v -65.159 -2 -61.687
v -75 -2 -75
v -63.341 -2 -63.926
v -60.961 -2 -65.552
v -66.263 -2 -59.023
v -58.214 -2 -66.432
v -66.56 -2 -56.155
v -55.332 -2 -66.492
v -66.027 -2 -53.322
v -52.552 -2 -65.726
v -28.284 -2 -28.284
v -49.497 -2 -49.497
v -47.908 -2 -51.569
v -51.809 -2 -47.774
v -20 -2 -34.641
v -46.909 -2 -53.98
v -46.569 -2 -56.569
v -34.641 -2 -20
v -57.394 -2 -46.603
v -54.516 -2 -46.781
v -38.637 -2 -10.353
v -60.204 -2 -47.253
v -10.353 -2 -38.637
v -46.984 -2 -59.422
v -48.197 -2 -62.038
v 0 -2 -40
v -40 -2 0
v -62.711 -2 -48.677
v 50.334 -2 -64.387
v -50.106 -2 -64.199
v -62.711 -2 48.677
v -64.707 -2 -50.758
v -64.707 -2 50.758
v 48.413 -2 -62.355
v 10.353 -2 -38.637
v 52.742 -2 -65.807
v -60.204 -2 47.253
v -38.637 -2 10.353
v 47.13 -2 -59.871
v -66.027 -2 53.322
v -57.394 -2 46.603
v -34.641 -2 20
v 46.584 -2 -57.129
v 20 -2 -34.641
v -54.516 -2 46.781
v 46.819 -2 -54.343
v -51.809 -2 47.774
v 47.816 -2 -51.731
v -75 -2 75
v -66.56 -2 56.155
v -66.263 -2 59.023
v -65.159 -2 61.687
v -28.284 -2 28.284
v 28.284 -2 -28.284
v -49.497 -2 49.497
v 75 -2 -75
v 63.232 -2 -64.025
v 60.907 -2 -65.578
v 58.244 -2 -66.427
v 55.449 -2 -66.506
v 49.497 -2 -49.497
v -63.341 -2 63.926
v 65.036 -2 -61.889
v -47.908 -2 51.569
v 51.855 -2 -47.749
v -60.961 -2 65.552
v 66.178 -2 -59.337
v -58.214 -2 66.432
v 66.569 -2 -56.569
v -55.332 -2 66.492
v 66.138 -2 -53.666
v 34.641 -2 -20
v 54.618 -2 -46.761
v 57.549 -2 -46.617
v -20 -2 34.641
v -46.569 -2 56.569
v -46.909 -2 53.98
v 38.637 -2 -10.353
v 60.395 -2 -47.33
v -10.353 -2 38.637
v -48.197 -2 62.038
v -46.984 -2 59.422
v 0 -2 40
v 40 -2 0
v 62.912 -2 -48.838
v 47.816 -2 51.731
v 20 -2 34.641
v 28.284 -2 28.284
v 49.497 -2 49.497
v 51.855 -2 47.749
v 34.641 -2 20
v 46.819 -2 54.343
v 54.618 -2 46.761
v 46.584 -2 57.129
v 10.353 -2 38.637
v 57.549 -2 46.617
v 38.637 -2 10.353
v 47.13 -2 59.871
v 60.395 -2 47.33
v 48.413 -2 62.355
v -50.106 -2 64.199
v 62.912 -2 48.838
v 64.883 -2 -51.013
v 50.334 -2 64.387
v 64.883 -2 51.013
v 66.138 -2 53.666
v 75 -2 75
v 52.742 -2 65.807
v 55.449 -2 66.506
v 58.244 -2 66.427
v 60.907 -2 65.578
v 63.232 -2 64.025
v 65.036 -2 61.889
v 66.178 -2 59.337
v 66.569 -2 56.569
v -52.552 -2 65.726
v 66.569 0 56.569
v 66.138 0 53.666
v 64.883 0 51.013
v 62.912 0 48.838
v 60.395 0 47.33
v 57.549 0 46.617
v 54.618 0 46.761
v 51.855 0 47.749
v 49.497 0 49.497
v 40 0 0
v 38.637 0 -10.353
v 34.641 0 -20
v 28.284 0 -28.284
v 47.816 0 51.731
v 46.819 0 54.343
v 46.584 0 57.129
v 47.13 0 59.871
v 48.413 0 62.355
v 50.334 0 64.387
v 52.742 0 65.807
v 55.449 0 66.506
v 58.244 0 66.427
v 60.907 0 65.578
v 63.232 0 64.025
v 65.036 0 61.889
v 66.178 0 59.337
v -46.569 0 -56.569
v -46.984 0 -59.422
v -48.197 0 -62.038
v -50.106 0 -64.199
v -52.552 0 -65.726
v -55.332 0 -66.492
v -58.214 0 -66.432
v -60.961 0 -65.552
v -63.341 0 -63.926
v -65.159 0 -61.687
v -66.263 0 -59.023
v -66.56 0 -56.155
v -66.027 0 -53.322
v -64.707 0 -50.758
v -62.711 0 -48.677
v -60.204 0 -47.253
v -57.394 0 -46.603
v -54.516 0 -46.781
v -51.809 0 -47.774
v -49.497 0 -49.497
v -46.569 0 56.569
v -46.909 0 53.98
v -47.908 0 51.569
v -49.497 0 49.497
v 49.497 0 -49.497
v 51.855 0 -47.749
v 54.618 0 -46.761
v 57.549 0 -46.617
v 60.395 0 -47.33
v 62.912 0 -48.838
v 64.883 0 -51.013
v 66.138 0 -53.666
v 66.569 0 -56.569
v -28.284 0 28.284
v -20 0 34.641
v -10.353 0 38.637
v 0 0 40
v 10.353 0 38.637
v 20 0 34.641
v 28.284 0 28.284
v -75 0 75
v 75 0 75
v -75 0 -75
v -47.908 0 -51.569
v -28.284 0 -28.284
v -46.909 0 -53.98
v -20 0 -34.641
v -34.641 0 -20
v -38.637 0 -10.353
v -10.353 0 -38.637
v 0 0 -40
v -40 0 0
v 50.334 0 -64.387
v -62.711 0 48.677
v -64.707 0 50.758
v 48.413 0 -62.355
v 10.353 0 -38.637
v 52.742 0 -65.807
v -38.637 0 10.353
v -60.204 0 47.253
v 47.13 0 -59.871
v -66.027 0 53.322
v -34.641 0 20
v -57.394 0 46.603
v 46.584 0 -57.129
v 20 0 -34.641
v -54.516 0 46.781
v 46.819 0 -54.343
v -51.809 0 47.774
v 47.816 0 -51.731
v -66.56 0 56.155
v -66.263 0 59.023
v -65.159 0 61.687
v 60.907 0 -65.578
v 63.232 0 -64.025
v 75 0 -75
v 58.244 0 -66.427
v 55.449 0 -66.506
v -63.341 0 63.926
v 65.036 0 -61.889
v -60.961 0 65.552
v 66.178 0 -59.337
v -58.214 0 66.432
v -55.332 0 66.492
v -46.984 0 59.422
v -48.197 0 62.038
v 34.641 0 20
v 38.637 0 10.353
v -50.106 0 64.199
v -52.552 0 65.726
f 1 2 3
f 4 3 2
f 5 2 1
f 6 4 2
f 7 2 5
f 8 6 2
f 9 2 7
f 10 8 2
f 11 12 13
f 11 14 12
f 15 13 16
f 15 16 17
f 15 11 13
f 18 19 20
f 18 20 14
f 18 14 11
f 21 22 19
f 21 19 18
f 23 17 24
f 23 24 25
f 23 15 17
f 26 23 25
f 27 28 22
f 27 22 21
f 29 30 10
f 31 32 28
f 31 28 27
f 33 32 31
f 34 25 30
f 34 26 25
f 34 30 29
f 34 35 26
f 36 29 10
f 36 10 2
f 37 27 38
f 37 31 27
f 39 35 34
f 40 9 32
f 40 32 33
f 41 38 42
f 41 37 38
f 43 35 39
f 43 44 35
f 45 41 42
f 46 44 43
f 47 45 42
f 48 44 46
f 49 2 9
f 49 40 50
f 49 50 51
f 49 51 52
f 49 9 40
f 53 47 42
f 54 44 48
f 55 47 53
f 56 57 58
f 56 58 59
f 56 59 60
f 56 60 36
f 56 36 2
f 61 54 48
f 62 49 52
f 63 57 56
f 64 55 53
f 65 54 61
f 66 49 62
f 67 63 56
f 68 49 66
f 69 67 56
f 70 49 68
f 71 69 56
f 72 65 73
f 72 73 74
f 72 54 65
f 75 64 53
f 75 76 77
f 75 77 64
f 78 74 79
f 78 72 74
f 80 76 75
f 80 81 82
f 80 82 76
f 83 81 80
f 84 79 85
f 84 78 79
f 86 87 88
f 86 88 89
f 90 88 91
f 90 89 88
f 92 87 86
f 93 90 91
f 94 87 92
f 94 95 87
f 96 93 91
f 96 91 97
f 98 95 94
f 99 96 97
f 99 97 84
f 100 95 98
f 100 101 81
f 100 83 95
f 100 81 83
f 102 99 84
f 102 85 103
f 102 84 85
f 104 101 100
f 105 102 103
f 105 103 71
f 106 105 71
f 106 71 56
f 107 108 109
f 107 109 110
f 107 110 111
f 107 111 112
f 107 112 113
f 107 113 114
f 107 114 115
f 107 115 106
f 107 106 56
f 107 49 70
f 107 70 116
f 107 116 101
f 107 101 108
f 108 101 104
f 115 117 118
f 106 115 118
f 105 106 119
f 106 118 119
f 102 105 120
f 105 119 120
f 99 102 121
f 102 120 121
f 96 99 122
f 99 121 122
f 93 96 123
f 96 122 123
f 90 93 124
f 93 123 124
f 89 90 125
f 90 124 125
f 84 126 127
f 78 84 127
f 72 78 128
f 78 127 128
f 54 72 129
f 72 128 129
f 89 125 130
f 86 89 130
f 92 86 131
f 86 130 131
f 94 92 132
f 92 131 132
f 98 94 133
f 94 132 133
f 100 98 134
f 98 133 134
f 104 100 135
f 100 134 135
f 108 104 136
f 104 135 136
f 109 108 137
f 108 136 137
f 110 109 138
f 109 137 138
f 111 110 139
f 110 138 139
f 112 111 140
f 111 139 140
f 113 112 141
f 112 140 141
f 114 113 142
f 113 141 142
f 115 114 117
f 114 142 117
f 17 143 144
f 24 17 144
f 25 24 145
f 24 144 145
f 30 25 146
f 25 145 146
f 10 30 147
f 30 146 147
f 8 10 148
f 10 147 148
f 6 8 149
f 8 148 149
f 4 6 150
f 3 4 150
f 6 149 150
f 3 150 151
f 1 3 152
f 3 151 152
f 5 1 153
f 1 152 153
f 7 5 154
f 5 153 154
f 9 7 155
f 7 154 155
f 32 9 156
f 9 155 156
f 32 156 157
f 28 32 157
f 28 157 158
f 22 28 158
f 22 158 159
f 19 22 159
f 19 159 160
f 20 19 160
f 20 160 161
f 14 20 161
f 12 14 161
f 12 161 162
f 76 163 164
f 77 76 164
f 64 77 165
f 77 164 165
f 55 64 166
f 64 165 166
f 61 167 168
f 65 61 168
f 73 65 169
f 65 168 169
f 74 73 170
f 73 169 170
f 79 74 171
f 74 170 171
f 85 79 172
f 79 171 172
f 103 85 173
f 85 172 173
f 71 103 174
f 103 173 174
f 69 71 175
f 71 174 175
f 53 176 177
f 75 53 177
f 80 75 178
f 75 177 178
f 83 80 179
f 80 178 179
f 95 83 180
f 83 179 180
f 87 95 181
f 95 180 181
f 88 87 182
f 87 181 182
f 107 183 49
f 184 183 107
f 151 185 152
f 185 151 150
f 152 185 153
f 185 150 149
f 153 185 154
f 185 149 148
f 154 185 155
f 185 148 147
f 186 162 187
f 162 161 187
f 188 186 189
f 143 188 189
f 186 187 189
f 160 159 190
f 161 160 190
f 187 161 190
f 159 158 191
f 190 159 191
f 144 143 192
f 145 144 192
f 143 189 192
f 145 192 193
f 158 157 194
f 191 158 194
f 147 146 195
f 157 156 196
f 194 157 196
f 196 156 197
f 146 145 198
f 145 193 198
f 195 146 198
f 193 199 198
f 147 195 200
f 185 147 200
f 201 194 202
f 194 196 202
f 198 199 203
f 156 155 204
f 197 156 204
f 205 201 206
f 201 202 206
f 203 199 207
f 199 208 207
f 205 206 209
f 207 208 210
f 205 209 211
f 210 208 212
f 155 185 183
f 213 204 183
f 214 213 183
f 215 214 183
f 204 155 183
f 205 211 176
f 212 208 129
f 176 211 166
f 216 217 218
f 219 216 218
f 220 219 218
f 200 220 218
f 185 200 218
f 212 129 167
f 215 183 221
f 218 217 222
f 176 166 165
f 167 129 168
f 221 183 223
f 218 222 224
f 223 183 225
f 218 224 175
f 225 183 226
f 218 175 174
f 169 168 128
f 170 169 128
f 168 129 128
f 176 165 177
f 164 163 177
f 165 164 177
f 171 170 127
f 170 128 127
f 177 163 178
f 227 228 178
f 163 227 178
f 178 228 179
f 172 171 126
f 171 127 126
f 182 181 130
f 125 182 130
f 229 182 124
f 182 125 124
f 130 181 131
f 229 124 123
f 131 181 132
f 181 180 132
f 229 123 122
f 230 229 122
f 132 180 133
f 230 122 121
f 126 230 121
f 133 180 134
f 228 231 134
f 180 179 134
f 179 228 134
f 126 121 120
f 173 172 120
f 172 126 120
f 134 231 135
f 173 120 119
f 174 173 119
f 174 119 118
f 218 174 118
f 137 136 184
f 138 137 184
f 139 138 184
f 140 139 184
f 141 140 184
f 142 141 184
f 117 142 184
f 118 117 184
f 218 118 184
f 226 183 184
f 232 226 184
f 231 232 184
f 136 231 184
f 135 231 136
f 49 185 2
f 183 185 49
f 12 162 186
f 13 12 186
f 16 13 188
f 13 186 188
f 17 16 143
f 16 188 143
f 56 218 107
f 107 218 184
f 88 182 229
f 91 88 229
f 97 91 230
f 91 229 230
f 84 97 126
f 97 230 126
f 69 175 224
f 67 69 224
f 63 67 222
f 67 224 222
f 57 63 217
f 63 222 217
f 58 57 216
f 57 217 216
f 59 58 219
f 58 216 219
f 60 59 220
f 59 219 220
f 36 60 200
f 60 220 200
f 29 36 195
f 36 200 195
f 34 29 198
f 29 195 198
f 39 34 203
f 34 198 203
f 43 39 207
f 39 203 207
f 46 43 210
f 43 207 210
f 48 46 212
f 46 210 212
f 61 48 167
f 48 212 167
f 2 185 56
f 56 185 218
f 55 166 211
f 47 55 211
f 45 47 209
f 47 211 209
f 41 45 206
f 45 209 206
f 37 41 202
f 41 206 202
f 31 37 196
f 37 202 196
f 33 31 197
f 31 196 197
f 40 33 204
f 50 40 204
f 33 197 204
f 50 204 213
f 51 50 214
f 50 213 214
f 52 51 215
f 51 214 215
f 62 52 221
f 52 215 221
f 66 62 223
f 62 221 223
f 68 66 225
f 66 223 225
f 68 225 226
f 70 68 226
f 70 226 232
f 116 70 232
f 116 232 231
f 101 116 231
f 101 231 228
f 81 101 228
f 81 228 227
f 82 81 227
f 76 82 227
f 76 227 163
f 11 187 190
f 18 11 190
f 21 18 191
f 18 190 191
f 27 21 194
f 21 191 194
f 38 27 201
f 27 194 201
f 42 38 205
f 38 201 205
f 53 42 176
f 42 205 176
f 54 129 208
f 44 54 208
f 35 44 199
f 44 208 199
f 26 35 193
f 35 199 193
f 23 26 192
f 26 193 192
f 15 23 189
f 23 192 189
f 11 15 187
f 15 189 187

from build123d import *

# Parameters (mm, degrees)
F0_W     = 150
F0_H     = 150
F1_DEPTH = 2


with BuildPart() as f1:
    # F0 (on Front) → F1 (new body)
    with BuildSketch(Plane.XZ):
        Rectangle(F0_W, F0_H)
        with BuildLine():
            ThreePointArc((-46.568542, -56.568542), (-65.807338, -60.395377), (-49.497475, -49.497475))
            ThreePointArc((-49.497475, -49.497475), (-47.329747, -52.741708), (-46.568542, -56.568542))
        make_face(mode=Mode.SUBTRACT)
        with BuildLine():
            ThreePointArc((66.568542, -56.568542), (52.741708, -65.807338), (49.497475, -49.497475))
            ThreePointArc((49.497475, -49.497475), (60.395377, -47.329747), (66.568542, -56.568542))
        make_face(mode=Mode.SUBTRACT)
        with BuildLine():
            ThreePointArc((-46.568542, 56.568542), (-47.329747, 52.741708), (-49.497475, 49.497475))
            ThreePointArc((-49.497475, 49.497475), (-65.807338, 60.395377), (-46.568542, 56.568542))
        make_face(mode=Mode.SUBTRACT)
        with BuildLine():
            ThreePointArc((-28.284271, 28.284271), (0, 40), (28.284271, 28.284271))
            ThreePointArc((28.284271, 28.284271), (36.955181, 15.307337), (40, 0))
            ThreePointArc((40, 0), (36.955181, -15.307337), (28.284271, -28.284271))
            ThreePointArc((28.284271, -28.284271), (0, -40), (-28.284271, -28.284271))
            ThreePointArc((-28.284271, -28.284271), (-40, 0), (-28.284271, 28.284271))
        make_face(mode=Mode.SUBTRACT)
        with BuildLine():
            ThreePointArc((66.568542, 56.568542), (60.395377, 47.329747), (49.497475, 49.497475))
            ThreePointArc((49.497475, 49.497475), (52.741708, 65.807338), (66.568542, 56.568542))
        make_face(mode=Mode.SUBTRACT)
    extrude(amount=F1_DEPTH)


solid = f1.part
